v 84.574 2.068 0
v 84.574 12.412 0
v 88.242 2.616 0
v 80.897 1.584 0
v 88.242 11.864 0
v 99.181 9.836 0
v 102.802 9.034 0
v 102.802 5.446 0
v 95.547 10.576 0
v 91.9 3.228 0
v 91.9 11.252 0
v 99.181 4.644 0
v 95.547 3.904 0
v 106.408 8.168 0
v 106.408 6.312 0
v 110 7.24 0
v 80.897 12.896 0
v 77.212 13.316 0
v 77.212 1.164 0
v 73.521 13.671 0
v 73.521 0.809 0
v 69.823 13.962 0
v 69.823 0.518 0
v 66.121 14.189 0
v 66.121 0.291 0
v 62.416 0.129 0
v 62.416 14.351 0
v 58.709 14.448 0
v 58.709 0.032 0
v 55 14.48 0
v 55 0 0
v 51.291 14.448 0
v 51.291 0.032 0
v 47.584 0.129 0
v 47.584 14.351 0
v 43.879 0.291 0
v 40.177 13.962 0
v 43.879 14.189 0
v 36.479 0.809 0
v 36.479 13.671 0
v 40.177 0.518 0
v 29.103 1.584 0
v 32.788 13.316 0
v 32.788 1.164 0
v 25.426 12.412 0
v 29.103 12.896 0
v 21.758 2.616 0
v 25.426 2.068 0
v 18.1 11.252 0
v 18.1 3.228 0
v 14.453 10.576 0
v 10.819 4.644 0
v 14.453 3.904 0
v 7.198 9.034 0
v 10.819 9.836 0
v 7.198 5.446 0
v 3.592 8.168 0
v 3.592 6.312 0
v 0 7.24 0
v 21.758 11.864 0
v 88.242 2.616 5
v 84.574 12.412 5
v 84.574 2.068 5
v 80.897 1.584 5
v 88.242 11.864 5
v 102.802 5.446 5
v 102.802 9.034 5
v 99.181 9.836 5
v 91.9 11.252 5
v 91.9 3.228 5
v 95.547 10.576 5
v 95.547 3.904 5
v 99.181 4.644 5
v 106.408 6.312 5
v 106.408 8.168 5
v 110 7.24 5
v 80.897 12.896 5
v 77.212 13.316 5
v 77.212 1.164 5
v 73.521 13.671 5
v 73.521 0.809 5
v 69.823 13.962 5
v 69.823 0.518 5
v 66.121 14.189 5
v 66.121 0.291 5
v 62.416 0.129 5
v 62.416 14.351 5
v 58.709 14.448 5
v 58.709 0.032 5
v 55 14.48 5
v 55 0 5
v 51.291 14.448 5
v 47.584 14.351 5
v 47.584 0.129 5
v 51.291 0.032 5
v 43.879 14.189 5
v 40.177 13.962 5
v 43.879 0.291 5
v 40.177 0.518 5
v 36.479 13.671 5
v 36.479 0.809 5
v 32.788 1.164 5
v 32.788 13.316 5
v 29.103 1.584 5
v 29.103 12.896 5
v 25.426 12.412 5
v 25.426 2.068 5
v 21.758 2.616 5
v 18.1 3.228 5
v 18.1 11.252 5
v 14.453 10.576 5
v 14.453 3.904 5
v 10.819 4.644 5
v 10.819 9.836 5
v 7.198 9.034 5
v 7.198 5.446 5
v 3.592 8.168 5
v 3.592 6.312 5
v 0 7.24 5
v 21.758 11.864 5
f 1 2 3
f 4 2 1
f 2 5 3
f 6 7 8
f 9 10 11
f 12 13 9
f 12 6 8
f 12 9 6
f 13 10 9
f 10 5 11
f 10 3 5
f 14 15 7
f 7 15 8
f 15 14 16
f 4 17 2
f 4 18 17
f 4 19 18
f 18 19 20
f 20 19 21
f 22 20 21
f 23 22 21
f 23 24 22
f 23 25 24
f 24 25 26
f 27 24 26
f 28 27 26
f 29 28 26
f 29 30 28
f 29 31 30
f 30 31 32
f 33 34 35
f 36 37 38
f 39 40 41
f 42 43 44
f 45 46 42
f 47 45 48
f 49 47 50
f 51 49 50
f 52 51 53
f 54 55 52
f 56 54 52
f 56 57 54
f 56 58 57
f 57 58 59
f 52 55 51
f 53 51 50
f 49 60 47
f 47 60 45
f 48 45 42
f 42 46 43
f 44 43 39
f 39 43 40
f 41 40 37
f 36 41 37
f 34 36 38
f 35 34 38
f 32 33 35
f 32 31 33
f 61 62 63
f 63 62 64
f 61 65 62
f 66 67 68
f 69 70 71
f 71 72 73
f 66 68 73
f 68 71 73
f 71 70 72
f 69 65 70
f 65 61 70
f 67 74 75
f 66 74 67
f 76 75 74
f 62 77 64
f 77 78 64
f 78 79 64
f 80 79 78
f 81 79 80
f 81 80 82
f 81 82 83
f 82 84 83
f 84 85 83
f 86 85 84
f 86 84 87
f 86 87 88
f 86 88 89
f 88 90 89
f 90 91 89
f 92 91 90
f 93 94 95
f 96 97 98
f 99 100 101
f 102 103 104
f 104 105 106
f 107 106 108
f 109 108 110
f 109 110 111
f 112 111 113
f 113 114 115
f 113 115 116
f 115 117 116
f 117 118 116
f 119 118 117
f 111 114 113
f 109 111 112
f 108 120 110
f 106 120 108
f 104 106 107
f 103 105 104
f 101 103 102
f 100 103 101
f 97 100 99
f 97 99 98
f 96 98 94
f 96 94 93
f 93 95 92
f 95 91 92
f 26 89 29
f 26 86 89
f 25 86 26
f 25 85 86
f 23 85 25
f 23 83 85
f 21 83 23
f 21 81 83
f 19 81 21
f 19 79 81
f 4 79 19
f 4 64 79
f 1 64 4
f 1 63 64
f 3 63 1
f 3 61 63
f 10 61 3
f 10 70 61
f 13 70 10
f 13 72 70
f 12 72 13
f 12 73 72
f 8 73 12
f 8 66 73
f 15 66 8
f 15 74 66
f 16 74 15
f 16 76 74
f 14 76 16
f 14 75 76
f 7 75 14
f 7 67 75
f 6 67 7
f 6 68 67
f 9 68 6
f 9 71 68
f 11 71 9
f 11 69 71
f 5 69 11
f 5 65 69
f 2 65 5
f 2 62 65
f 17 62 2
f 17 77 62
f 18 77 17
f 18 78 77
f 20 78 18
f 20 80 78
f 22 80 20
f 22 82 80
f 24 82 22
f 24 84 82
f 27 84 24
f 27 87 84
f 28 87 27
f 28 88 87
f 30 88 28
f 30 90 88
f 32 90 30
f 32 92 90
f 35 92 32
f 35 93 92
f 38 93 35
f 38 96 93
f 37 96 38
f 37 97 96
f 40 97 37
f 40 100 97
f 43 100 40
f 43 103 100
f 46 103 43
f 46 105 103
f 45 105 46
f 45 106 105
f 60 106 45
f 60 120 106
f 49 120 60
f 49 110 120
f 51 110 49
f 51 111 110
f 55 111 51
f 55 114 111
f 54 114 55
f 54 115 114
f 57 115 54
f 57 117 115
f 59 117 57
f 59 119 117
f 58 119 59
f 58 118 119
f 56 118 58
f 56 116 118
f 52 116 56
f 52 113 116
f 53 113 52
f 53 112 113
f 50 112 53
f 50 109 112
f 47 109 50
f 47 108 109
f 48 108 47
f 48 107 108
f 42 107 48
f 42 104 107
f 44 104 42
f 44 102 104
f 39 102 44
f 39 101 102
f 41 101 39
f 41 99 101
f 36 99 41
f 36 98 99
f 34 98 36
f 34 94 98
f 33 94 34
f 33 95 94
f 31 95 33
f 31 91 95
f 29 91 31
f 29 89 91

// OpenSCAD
$fn = 32;

// ----------------------------------------------------------------------
// Arc profile plate: lens, 60 points
// ----------------------------------------------------------------------

// --- parameters (mm) ---
lens_chord = 110;         // chord length of the lens, X
arc_r = 212.5;            // radius of both arcs
arc_angle = 30;           // angle of each arc, degrees
sagitta = 7.24;           // bulge of each arc (half the lens height)
arc_step = 1;             // sampling step of the arcs, degrees
plate_t = 5;              // plate thickness, Z

bbox_y = 2 * sagitta;  // full lens height

profile = [[110, 7.24], [106.408, 8.168], [102.802, 9.034], [99.181, 9.836], [95.547, 10.576], [91.9, 11.252], [88.242, 11.864], [84.574, 12.412], [80.897, 12.896], [77.212, 13.316], [73.521, 13.671], [69.823, 13.962], [66.121, 14.189], [62.416, 14.351], [58.709, 14.448], [55, 14.48], [51.291, 14.448], [47.584, 14.351], [43.879, 14.189], [40.177, 13.962], [36.479, 13.671], [32.788, 13.316], [29.103, 12.896], [25.426, 12.412], [21.758, 11.864], [18.1, 11.252], [14.453, 10.576], [10.819, 9.836], [7.198, 9.034], [3.592, 8.168], [0, 7.24], [3.592, 6.312], [7.198, 5.446], [10.819, 4.644], [14.453, 3.904], [18.1, 3.228], [21.758, 2.616], [25.426, 2.068], [29.103, 1.584], [32.788, 1.164], [36.479, 0.809], [40.177, 0.518], [43.879, 0.291], [47.584, 0.129], [51.291, 0.032], [55, 0], [58.709, 0.032], [62.416, 0.129], [66.121, 0.291], [69.823, 0.518], [73.521, 0.809], [77.212, 1.164], [80.897, 1.584], [84.574, 2.068], [88.242, 2.616], [91.9, 3.228], [95.547, 3.904], [99.181, 4.644], [102.802, 5.446], [106.408, 6.312]];  // primary outline, 60 points, counter clockwise

// --- the one profile operation ---
linear_extrude(height = plate_t) polygon(points = profile);
